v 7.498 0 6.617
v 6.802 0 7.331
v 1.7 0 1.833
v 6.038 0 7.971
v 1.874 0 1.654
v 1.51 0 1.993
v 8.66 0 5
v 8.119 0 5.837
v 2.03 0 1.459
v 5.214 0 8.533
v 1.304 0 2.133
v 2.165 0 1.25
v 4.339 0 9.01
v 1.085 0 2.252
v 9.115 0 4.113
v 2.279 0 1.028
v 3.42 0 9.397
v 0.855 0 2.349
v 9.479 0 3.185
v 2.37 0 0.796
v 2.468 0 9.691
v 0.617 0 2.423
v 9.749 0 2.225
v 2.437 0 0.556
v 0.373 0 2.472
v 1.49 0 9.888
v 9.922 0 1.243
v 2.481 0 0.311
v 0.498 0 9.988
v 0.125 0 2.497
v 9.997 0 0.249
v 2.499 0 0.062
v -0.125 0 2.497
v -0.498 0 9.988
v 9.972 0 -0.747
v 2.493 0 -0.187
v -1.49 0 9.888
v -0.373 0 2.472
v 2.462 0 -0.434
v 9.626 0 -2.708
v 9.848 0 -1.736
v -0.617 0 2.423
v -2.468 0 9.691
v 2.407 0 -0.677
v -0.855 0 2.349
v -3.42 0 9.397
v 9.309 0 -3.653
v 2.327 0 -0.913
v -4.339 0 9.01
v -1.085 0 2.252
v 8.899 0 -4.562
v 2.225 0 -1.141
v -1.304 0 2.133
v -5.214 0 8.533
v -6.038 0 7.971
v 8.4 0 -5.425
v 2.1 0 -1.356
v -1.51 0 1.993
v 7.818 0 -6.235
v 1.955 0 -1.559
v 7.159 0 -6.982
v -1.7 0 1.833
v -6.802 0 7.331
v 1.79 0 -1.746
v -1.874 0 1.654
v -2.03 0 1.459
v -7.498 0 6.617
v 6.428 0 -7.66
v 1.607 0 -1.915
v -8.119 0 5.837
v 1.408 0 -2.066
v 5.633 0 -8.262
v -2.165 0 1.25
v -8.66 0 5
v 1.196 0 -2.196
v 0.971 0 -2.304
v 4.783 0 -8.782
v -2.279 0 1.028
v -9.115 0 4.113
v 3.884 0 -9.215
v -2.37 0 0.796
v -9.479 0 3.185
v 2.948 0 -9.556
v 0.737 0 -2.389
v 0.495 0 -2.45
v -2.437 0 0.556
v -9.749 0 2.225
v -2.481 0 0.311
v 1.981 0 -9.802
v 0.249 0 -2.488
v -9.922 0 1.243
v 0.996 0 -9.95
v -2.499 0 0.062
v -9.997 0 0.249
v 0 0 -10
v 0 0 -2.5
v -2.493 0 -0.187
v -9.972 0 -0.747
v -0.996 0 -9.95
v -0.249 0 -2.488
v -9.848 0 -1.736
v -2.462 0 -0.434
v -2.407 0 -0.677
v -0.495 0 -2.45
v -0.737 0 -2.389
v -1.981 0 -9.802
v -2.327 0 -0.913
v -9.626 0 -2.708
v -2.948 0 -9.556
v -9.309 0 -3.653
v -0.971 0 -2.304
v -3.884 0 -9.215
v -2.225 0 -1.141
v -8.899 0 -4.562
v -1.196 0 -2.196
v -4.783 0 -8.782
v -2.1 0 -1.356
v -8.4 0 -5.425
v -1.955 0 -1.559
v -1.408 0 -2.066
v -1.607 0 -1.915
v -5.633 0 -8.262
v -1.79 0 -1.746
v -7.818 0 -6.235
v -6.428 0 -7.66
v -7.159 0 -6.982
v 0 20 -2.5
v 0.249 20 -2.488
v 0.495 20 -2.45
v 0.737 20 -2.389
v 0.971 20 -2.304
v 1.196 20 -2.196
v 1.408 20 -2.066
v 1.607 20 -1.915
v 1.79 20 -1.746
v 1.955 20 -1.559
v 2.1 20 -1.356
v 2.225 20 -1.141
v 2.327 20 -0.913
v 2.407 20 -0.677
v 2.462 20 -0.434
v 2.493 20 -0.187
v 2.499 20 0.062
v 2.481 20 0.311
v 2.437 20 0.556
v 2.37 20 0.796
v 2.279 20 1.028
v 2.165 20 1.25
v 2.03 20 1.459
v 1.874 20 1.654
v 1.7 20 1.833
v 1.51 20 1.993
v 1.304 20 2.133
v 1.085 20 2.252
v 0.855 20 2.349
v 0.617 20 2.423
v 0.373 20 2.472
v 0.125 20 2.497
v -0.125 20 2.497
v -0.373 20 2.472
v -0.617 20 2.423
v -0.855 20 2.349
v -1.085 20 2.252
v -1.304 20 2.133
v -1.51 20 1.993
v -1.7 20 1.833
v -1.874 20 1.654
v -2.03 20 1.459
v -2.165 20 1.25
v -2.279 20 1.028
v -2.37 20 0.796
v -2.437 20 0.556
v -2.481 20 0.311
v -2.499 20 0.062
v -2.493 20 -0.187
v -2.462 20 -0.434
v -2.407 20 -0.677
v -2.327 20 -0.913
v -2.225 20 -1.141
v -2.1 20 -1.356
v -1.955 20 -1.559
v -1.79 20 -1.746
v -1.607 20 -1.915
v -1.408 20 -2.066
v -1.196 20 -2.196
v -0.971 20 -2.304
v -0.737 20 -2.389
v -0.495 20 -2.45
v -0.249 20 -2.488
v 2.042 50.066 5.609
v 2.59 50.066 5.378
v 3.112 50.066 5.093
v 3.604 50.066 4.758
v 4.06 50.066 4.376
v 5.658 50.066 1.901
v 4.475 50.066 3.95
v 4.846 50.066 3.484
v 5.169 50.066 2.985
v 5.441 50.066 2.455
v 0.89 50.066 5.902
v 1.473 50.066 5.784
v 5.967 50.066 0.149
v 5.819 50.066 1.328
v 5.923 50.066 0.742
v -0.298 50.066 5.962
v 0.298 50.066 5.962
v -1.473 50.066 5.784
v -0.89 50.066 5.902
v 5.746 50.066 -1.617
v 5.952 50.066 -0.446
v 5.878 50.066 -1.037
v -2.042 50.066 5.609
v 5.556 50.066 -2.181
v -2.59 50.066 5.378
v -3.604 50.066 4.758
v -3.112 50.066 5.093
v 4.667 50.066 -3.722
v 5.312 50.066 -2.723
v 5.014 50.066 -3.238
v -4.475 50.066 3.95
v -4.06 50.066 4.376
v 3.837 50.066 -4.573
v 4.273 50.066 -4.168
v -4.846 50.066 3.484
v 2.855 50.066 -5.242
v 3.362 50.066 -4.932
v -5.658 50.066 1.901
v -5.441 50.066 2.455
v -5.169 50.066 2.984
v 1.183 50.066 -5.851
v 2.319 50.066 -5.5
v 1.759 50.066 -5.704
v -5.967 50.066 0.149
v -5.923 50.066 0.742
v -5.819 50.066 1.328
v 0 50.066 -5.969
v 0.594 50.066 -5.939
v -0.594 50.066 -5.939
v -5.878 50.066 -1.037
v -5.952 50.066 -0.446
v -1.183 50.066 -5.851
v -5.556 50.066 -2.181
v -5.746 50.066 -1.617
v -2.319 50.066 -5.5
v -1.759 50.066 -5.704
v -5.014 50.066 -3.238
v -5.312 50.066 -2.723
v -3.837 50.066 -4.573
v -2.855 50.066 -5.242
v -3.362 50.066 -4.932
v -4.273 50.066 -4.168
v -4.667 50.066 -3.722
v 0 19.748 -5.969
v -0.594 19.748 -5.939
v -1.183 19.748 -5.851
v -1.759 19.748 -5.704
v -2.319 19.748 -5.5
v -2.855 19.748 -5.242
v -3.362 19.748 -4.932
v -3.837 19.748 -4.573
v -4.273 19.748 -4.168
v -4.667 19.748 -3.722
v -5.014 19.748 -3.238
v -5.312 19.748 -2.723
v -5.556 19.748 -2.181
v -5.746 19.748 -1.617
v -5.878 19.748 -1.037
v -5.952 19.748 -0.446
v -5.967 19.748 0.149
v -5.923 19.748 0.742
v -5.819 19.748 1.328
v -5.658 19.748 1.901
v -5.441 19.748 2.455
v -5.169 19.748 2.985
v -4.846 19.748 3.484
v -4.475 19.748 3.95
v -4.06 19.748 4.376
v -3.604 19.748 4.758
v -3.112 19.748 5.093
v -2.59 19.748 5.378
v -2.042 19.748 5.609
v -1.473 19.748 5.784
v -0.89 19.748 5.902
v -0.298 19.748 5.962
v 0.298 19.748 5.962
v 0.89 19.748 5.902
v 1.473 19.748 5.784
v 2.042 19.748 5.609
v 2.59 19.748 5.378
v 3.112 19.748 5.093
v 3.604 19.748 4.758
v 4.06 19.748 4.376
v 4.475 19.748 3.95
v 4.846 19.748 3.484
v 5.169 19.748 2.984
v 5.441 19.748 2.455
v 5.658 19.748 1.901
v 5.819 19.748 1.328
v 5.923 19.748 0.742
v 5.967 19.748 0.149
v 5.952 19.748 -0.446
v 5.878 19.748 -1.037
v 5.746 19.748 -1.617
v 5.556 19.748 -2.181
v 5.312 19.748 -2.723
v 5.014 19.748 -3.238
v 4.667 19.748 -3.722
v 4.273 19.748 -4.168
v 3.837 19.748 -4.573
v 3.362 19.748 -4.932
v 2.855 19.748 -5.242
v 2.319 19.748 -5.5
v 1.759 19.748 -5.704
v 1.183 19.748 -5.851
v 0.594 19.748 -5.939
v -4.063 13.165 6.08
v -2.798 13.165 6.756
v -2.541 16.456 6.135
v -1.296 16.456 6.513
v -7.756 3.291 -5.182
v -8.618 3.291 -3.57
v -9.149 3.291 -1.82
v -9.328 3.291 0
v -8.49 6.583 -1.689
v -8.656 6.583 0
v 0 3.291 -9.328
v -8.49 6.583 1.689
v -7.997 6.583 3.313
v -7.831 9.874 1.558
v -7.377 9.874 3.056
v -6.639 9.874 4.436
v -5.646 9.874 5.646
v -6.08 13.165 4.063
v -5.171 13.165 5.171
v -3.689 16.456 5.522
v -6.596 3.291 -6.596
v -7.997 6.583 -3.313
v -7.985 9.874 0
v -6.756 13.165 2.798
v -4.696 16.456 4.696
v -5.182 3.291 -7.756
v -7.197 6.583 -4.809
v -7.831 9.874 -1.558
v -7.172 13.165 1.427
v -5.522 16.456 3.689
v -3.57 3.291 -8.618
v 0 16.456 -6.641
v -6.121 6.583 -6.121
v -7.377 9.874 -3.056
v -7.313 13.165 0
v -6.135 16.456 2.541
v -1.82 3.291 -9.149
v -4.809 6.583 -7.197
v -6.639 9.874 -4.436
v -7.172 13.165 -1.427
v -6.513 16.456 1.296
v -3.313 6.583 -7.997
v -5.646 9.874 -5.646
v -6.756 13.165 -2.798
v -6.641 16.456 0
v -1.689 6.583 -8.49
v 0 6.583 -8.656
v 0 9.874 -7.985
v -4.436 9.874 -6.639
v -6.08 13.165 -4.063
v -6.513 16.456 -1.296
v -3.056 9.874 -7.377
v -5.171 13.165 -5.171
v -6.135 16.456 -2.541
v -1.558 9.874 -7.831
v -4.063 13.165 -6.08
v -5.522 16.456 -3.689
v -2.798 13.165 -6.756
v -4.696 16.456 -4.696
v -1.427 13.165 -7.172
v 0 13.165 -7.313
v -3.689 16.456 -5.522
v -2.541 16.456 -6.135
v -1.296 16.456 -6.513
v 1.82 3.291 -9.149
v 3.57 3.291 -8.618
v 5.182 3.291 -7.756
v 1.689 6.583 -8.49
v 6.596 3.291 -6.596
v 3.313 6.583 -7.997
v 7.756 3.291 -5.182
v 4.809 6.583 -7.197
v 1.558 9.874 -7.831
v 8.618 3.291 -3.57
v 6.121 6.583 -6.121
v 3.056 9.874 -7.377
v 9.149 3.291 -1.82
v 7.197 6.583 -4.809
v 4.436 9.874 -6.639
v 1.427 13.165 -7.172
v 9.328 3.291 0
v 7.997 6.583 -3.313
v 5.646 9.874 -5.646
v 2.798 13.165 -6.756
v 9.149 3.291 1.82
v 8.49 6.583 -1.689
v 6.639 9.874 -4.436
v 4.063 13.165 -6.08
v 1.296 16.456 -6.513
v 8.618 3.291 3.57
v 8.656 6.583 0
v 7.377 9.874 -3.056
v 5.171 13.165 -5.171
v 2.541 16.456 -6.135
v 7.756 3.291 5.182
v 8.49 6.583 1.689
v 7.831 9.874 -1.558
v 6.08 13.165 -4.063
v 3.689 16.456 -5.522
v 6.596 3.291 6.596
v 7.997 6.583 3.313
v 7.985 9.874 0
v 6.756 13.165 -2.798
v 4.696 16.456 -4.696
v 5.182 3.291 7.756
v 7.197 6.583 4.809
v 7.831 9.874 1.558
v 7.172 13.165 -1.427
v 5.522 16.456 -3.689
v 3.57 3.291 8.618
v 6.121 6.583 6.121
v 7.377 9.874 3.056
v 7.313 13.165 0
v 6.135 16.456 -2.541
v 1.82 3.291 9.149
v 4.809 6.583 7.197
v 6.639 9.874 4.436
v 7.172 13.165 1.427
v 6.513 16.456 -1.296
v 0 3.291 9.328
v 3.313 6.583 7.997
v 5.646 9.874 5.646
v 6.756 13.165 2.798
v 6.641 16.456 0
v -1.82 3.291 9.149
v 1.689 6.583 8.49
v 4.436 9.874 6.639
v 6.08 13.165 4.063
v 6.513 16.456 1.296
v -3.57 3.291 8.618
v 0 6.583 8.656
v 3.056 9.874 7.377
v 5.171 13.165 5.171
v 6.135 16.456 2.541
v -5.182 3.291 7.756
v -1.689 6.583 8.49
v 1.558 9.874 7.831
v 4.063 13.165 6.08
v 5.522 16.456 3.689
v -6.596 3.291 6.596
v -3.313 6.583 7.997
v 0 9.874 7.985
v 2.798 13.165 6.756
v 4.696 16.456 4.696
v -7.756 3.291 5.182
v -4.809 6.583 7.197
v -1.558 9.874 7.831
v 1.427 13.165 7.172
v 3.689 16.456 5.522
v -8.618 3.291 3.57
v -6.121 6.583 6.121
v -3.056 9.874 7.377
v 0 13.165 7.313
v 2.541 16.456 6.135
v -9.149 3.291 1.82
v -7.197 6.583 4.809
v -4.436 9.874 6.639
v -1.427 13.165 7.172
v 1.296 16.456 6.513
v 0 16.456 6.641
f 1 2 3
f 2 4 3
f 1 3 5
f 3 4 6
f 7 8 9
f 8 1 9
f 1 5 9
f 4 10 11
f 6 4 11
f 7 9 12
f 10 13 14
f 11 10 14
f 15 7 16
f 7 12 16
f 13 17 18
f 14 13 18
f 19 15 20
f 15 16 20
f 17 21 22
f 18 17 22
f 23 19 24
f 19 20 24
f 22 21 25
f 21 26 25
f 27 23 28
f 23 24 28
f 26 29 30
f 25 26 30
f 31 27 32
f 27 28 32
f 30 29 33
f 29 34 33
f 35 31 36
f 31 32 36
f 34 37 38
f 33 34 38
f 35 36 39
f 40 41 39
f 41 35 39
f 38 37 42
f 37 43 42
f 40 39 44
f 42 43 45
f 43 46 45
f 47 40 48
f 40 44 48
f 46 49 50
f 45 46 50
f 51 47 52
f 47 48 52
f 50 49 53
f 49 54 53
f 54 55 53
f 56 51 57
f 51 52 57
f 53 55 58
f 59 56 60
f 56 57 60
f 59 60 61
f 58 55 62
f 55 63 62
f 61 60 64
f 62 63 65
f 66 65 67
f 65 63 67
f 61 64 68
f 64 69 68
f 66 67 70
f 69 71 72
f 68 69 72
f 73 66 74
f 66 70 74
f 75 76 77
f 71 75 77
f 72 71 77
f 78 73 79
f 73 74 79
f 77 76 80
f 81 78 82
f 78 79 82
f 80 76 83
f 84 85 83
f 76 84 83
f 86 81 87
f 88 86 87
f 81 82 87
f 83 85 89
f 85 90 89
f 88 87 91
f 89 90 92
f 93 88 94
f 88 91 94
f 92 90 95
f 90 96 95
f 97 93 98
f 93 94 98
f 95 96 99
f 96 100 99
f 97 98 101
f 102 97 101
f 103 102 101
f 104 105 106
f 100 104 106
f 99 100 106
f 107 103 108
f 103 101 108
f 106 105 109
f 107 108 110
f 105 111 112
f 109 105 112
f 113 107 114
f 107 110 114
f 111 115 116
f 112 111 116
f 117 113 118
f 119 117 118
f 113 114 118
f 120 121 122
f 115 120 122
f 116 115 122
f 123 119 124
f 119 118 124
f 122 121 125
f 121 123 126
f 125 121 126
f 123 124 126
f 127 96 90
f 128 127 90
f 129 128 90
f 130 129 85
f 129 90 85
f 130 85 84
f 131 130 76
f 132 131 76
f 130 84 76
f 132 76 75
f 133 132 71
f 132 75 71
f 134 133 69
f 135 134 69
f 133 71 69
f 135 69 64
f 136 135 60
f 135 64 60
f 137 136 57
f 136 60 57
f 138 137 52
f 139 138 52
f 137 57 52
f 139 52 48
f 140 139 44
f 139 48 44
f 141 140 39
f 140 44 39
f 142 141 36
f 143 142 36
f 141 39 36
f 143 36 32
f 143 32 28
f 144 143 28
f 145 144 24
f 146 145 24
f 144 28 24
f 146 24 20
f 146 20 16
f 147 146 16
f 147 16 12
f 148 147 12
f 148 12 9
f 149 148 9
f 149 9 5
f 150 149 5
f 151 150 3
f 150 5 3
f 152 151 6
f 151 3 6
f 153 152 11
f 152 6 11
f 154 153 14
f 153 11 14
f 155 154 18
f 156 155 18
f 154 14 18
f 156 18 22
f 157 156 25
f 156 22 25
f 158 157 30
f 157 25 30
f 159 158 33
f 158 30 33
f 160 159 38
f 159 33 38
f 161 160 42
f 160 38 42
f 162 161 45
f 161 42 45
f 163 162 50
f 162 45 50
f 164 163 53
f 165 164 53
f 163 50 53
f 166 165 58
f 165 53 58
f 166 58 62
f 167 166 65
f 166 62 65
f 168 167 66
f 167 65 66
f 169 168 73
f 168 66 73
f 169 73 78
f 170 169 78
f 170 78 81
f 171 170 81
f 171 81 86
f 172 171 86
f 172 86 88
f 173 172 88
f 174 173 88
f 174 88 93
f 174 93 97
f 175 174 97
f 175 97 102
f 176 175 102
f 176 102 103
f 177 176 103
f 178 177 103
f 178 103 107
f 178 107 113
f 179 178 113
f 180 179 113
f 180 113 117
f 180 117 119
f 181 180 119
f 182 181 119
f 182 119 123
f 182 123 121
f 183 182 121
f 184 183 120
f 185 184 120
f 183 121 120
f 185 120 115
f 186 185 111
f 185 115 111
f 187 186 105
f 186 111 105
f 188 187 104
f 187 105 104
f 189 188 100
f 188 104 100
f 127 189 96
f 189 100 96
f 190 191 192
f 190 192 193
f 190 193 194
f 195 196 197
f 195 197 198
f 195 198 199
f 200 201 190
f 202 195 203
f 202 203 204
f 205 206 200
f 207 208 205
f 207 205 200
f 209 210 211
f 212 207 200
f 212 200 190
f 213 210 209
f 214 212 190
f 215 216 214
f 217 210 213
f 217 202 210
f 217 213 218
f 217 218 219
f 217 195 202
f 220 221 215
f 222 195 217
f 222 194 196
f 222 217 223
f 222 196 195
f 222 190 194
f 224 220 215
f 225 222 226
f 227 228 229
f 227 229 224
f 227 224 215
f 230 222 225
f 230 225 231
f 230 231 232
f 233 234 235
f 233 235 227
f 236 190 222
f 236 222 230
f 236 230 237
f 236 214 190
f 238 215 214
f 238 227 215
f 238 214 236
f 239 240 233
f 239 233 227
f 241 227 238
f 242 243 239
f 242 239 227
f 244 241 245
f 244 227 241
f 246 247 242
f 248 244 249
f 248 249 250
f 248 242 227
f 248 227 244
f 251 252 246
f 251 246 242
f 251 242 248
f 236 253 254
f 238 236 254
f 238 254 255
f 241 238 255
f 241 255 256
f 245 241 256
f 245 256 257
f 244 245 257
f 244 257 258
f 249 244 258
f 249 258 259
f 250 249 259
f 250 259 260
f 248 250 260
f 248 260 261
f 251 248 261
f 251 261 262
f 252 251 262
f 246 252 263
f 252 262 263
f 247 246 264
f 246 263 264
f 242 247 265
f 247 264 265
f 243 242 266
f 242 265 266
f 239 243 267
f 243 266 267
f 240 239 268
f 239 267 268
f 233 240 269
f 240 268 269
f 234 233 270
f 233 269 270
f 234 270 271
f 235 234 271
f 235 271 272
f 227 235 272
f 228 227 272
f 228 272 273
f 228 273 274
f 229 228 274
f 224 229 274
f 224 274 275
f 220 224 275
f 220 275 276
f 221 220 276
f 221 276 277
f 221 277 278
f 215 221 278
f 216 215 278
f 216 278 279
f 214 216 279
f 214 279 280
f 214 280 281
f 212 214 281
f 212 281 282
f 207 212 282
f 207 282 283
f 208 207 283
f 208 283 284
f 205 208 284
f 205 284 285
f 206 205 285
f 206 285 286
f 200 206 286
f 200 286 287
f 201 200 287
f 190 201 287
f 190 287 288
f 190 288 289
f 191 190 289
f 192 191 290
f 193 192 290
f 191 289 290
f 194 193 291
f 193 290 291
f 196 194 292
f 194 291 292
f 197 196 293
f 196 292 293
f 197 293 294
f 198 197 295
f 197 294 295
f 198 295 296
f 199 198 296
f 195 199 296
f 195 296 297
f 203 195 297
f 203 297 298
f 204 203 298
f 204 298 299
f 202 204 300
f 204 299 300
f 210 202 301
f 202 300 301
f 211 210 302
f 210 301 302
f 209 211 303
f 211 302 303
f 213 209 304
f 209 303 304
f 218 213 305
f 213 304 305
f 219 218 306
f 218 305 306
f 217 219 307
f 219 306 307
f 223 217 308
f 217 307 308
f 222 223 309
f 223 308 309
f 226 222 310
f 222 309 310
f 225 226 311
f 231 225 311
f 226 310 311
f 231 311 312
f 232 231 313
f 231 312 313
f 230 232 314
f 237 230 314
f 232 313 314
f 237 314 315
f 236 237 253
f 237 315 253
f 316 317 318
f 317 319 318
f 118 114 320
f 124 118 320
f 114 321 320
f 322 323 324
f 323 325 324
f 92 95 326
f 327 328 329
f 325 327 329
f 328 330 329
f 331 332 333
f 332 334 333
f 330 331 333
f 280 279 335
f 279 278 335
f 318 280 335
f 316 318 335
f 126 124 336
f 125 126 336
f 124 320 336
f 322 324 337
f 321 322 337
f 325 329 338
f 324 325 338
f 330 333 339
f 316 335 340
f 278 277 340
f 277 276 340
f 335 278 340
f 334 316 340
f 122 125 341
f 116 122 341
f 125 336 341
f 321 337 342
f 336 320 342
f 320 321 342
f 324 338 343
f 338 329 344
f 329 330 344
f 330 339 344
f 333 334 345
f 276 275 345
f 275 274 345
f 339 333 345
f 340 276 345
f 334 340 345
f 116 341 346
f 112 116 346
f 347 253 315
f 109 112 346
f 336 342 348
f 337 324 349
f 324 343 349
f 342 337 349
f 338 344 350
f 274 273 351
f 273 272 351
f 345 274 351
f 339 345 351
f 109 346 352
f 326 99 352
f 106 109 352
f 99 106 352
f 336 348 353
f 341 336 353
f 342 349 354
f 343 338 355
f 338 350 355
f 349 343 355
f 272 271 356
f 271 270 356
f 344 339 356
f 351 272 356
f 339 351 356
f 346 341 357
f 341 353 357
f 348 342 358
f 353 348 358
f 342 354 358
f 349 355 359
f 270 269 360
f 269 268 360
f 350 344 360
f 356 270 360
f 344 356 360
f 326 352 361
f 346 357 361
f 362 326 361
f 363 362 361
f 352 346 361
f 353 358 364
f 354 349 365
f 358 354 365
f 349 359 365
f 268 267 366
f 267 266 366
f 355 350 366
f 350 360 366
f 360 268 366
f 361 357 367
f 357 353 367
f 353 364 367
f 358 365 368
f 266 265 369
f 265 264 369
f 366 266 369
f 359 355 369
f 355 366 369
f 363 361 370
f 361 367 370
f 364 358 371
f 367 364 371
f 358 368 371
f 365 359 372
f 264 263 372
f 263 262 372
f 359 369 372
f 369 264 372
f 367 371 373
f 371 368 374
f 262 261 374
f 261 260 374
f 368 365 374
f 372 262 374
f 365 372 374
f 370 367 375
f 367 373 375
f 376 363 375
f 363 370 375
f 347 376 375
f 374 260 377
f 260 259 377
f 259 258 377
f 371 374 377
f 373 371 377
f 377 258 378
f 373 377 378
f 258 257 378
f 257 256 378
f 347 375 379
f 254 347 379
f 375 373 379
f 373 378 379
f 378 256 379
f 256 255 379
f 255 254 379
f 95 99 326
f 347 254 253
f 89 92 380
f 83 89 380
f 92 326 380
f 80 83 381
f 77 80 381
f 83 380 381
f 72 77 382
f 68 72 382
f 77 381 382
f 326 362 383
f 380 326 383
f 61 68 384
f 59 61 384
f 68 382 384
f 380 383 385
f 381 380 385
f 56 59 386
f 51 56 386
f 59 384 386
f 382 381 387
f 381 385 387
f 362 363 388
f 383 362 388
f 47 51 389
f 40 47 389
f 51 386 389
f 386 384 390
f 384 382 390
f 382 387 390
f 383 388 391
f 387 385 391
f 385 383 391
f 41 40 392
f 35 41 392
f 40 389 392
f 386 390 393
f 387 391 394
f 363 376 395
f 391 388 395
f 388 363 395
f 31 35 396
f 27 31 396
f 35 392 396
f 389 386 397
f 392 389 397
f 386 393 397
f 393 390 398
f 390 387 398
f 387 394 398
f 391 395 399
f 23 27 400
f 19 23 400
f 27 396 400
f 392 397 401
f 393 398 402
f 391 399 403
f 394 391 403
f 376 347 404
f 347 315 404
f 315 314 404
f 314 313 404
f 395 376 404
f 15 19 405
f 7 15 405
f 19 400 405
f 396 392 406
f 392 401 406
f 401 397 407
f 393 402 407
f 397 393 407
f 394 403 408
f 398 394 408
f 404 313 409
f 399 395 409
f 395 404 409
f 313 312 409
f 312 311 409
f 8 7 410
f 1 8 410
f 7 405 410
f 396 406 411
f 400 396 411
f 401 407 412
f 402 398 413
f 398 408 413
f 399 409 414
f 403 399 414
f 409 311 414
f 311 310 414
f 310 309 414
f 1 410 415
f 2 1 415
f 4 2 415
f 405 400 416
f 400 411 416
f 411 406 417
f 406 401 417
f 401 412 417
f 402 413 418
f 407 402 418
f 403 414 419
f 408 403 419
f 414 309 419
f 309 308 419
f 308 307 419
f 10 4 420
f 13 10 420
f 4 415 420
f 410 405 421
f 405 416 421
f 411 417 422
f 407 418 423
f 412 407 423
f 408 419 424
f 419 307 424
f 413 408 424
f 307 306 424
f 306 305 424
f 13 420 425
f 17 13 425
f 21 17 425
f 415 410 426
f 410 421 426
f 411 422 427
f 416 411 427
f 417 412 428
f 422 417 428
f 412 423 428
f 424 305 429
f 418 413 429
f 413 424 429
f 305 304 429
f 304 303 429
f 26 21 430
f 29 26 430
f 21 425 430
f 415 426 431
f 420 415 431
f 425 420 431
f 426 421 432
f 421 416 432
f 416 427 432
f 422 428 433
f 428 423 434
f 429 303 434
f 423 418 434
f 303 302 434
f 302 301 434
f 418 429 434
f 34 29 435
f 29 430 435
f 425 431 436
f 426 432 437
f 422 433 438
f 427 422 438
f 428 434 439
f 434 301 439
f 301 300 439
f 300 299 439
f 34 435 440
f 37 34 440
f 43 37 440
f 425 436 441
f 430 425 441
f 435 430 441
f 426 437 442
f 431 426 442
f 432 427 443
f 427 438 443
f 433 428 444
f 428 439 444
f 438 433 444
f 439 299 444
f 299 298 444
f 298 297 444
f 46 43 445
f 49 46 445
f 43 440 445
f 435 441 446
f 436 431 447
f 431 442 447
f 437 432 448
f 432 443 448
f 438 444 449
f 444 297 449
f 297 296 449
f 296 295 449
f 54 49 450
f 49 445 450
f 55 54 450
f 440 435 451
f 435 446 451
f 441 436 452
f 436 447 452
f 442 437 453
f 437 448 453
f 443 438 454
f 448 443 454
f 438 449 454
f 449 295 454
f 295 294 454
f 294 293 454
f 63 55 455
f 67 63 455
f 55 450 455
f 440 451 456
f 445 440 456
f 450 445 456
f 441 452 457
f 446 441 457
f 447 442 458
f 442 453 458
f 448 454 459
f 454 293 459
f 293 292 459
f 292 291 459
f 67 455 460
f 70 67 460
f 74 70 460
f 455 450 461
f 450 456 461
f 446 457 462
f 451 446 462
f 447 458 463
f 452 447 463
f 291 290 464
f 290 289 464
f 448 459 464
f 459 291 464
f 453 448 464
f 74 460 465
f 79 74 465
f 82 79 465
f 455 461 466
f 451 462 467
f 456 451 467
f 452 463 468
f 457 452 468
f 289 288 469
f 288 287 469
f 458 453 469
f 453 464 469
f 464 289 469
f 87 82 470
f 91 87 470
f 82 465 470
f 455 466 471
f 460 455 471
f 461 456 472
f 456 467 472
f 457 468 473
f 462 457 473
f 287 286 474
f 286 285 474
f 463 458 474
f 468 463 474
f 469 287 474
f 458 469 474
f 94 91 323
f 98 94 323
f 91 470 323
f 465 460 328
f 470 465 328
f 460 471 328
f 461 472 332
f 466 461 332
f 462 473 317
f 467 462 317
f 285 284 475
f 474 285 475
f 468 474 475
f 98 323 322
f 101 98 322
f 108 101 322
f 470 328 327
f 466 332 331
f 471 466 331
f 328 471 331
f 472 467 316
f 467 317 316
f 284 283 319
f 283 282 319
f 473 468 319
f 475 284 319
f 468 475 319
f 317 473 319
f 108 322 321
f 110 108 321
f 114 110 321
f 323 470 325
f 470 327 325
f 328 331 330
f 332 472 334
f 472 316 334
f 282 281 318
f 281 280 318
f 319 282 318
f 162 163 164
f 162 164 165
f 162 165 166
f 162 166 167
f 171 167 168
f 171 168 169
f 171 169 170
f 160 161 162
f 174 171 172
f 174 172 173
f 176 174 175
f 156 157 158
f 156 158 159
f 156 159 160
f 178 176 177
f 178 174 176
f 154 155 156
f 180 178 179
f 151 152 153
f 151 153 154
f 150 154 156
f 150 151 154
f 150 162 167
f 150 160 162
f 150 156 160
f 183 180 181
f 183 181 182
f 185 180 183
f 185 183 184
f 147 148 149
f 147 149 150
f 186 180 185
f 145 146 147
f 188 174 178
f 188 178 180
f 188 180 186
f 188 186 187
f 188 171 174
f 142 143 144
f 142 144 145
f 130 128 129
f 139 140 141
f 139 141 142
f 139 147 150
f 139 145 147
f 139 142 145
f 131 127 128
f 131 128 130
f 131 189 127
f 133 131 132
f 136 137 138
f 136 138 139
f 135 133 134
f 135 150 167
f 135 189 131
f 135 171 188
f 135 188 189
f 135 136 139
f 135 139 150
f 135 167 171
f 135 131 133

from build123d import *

# Parameters (mm, degrees)
SKETCH2_R           = 5.969
BOSS_EXTRUDE1_DEPTH = 50.066
SKETCH7_R           = 2.5
CUT_EXTRUDE2_DEPTH  = 20


with BuildPart() as part:
    # Sketch1 → Revolve1 (revolve)
    with BuildSketch(Plane.XY, mode=Mode.PRIVATE) as revolve1_sk:
        Polygon((0, 0), (-10, 0), (0, 48.989794856), align=None)
    revolve(revolve1_sk.sketch.rotate(Axis((0, 48.989794856, 0), (0, -1, 0)), 90), axis=Axis((0, 48.989794856, 0), (0, -1, 0)))

    # Sketch2 → Boss-Extrude1 (add)
    with BuildSketch(Plane(origin=(0, 0, 0), x_dir=(1, 0, 0), z_dir=(0, 1, 0))):
        with Locations(Location((0, 0, 0), (0, 0, 90))):
            Circle(SKETCH2_R)
    extrude(amount=BOSS_EXTRUDE1_DEPTH)

    # Sketch7 → Cut-Extrude2 (cut)
    with BuildSketch(Plane.XZ):
        with Locations(Location((0, 0, 0), (0, 0, 270))):
            Circle(SKETCH7_R)
    extrude(amount=-CUT_EXTRUDE2_DEPTH, mode=Mode.SUBTRACT)


solid = part.part
